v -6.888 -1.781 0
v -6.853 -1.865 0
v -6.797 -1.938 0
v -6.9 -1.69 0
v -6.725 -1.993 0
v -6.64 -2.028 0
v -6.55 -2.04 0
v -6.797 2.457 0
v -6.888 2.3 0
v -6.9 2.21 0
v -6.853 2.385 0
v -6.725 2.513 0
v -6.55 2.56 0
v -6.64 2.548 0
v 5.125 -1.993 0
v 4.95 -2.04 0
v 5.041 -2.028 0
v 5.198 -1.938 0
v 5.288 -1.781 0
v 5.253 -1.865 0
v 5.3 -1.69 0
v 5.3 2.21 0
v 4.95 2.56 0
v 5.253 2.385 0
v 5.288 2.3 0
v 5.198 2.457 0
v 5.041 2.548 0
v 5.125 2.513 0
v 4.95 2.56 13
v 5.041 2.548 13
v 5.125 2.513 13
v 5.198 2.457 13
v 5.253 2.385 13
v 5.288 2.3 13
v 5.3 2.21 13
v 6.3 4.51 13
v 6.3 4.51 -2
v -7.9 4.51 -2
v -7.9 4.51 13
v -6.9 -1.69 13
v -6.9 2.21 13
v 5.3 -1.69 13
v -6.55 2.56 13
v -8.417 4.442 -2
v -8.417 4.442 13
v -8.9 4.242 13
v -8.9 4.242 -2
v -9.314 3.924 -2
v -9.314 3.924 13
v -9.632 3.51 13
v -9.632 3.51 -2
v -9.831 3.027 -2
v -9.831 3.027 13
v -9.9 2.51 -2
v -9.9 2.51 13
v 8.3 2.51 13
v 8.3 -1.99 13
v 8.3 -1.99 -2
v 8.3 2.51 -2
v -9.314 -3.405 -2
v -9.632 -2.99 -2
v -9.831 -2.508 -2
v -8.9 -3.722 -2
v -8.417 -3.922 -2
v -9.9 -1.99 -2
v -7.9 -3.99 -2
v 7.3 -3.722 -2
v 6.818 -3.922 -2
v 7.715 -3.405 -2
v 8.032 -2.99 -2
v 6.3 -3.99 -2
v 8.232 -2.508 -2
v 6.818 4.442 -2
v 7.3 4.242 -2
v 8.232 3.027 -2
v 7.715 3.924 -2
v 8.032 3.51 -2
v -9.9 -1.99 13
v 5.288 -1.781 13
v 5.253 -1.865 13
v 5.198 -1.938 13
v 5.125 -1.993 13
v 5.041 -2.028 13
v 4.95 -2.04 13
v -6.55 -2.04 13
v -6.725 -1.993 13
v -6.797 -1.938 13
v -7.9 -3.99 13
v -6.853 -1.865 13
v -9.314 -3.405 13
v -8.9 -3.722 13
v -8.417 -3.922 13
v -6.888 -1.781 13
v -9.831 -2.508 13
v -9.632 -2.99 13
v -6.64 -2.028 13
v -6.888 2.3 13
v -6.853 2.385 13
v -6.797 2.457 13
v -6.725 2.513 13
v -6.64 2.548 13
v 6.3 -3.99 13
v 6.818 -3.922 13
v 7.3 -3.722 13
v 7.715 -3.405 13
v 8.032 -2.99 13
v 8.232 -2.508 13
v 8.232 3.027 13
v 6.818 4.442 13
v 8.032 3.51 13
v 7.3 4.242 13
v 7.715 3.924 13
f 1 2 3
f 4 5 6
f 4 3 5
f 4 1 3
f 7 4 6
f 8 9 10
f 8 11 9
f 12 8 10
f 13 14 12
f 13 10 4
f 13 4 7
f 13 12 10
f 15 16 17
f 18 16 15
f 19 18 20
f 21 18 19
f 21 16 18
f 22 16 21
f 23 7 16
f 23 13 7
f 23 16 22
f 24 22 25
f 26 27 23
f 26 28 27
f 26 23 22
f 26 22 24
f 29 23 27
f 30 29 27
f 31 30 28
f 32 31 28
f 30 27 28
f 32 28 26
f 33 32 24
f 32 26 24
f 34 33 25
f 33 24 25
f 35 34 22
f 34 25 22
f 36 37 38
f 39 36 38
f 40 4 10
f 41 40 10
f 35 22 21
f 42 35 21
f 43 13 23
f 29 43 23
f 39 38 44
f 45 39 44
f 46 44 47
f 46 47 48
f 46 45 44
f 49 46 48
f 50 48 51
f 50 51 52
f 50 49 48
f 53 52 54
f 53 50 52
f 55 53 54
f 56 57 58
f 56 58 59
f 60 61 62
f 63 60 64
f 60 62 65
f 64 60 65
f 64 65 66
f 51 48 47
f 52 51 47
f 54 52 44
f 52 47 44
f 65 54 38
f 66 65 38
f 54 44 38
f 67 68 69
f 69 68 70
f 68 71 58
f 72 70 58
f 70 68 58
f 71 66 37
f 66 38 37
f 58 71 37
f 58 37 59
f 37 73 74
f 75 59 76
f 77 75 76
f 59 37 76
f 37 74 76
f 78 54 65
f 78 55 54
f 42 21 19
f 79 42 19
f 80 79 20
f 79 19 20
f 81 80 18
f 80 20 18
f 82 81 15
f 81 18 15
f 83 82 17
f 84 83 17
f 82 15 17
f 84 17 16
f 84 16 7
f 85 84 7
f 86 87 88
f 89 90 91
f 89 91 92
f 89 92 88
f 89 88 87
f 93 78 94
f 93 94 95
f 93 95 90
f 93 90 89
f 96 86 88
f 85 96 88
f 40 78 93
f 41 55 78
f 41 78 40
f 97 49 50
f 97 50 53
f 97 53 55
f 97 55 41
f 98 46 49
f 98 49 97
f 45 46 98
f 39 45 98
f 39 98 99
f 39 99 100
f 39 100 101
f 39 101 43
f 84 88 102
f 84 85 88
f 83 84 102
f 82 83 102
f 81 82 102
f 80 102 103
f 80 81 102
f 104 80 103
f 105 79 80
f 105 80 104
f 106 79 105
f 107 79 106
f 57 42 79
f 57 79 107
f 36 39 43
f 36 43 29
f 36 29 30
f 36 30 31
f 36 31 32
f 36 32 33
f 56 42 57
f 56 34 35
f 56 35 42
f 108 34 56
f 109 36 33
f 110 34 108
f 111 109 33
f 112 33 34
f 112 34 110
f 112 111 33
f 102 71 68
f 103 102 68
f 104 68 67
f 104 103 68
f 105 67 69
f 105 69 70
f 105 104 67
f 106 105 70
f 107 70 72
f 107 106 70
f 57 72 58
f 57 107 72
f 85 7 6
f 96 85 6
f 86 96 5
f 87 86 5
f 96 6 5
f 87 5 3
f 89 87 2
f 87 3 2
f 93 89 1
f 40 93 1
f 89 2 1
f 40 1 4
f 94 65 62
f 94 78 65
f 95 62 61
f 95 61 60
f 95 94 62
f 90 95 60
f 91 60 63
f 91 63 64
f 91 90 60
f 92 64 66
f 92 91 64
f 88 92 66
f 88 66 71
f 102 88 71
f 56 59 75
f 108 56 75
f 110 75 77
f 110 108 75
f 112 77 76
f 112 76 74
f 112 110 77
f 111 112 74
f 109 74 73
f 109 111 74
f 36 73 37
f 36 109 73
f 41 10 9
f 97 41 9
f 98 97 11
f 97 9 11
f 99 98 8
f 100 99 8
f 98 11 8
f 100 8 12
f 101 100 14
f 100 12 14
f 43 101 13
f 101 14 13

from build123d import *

# Parameters (mm, degrees)
F0_W     = 0.7
F0_H     = 0.3
F0_W_2   = 0.25
F1_DEPTH = 13
F0_W_3   = 0.1
F2_DEPTH = 2


with BuildPart() as f1:
    # F0 (on Top) → F1 (new body)
    with BuildSketch(Plane.XY):
        with BuildLine():
            ThreePointArc((-9.8996258792, -1.990333008), (-9.3138394415, -3.4045465704), (-7.8996258792, -3.990333008))
            Line((-7.8996258792, -3.990333008), (6.3003741208, -3.990333008))
            ThreePointArc((6.3003741208, -3.990333008), (7.7145876832, -3.4045465704), (8.3003741208, -1.990333008))
            Line((8.3003741208, -1.990333008), (8.3003741208, 2.509666992))
            ThreePointArc((8.3003741208, 2.509666992), (7.7145876832, 3.9238805544), (6.3003741208, 4.509666992))
            Line((6.3003741208, 4.509666992), (-7.8996258792, 4.509666992))
            ThreePointArc((-7.8996258792, 4.509666992), (-9.3138394415, 3.9238805544), (-9.8996258792, 2.509666992))
            Line((-9.8996258792, 2.509666992), (-9.8996258792, -1.990333008))
        make_face()
        with BuildLine():
            Line((-8.6496258792, 1.359666992), (-7.5996258792, 1.359666992))
            Line((-7.5996258792, 1.359666992), (-7.5996258792, 2.209666992))
            ThreePointArc((-7.5996258792, 2.209666992), (-7.2920879994, 2.9521291122), (-6.5496258792, 3.259666992))
            Line((-6.5496258792, 3.259666992), (4.9503741208, 3.259666992))
            ThreePointArc((4.9503741208, 3.259666992), (5.6928362411, 2.9521291122), (6.0003741208, 2.209666992))
            Line((6.0003741208, 2.209666992), (6.0003741208, 1.359666992))
            Line((6.0003741208, 1.359666992), (7.0503741208, 1.359666992))
            Line((7.0503741208, 1.359666992), (7.0503741208, 0.359666992))
            Line((7.0503741208, 0.359666992), (7.0503741208, -0.840333008))
            Line((7.0503741208, -0.840333008), (6.0003741208, -0.840333008))
            Line((6.0003741208, -0.840333008), (6.0003741208, -1.690333008))
            ThreePointArc((6.0003741208, -1.690333008), (5.6928362411, -2.4327951283), (4.9503741208, -2.740333008))
            Line((4.9503741208, -2.740333008), (-6.5496258792, -2.740333008))
            ThreePointArc((-6.5496258792, -2.740333008), (-7.2920879994, -2.4327951283), (-7.5996258792, -1.690333008))
            Line((-7.5996258792, -1.690333008), (-7.5996258792, -0.840333008))
            Line((-7.5996258792, -0.840333008), (-8.6496258792, -0.840333008))
            Line((-8.6496258792, -0.840333008), (-8.6496258792, 0.359666992))
            Line((-8.6496258792, 0.359666992), (-8.6496258792, 1.359666992))
        make_face(mode=Mode.SUBTRACT)
        with BuildLine():
            Line((-7.5996258792, 0.559666992), (-6.8996258792, 0.559666992))
            Line((-6.8996258792, 0.559666992), (-6.8996258792, 0.759666992))
            Line((-6.8996258792, 0.759666992), (-6.8996258792, 2.209666992))
            ThreePointArc((-6.8996258792, 2.209666992), (-6.7971132526, 2.4571543654), (-6.5496258792, 2.559666992))
            Line((-6.5496258792, 2.559666992), (4.9503741208, 2.559666992))
            ThreePointArc((4.9503741208, 2.559666992), (5.1978614943, 2.4571543654), (5.3003741208, 2.209666992))
            Line((5.3003741208, 2.209666992), (5.3003741208, 0.759666992))
            Line((5.3003741208, 0.759666992), (5.3003741208, 0.559666992))
            Line((5.3003741208, 0.559666992), (6.0003741208, 0.559666992))
            Line((6.0003741208, 0.559666992), (6.0003741208, 1.359666992))
            Line((6.0003741208, 1.359666992), (6.0003741208, 2.209666992))
            ThreePointArc((6.0003741208, 2.209666992), (5.6928362411, 2.9521291122), (4.9503741208, 3.259666992))
            Line((4.9503741208, 3.259666992), (-6.5496258792, 3.259666992))
            ThreePointArc((-6.5496258792, 3.259666992), (-7.2920879994, 2.9521291122), (-7.5996258792, 2.209666992))
            Line((-7.5996258792, 2.209666992), (-7.5996258792, 1.359666992))
            Line((-7.5996258792, 1.359666992), (-7.5996258792, 0.559666992))
        make_face()
        Polygon((-7.8496258792, 0.559666992), (-7.5996258792, 0.559666992), (-7.5996258792, 1.359666992), (-8.6496258792, 1.359666992), (-8.6496258792, 0.359666992), (-8.6496258792, -0.840333008), (-7.5996258792, -0.840333008), (-7.5996258792, -0.040333008), (-7.8496258792, -0.040333008), (-7.8496258792, 0.259666992), align=None)
        with Locations((-7.2496258792, 0.409666992)):
            Rectangle(F0_W, F0_H)
        with Locations((-7.7246258792, 0.409666992)):
            Rectangle(F0_W_2, F0_H)
        with Locations((-7.2496258792, 0.109666992)):
            Rectangle(F0_W, F0_H)
        with BuildLine():
            Line((-6.8996258792, -1.690333008), (-6.8996258792, -0.040333008))
            Line((-6.8996258792, -0.040333008), (-7.5996258792, -0.040333008))
            Line((-7.5996258792, -0.040333008), (-7.5996258792, -0.840333008))
            Line((-7.5996258792, -0.840333008), (-7.5996258792, -1.690333008))
            ThreePointArc((-7.5996258792, -1.690333008), (-7.2920879994, -2.4327951283), (-6.5496258792, -2.740333008))
            Line((-6.5496258792, -2.740333008), (4.9503741208, -2.740333008))
            ThreePointArc((4.9503741208, -2.740333008), (5.6928362411, -2.4327951283), (6.0003741208, -1.690333008))
            Line((6.0003741208, -1.690333008), (6.0003741208, -0.840333008))
            Line((6.0003741208, -0.840333008), (6.0003741208, -0.040333008))
            Line((6.0003741208, -0.040333008), (5.3003741208, -0.040333008))
            Line((5.3003741208, -0.040333008), (5.3003741208, -1.690333008))
            ThreePointArc((5.3003741208, -1.690333008), (5.1978614943, -1.9378203814), (4.9503741208, -2.040333008))
            Line((4.9503741208, -2.040333008), (-6.5496258792, -2.040333008))
            ThreePointArc((-6.5496258792, -2.040333008), (-6.7971132526, -1.9378203814), (-6.8996258792, -1.690333008))
        make_face()
        with Locations((5.6503741208, 0.109666992)):
            Rectangle(F0_W, F0_H)
        with Locations((5.6503741208, 0.409666992)):
            Rectangle(F0_W, F0_H)
        Polygon((6.0003741208, 1.359666992), (6.0003741208, 0.559666992), (6.2503741208, 0.559666992), (6.2503741208, 0.259666992), (6.2503741208, -0.040333008), (6.0003741208, -0.040333008), (6.0003741208, -0.840333008), (7.0503741208, -0.840333008), (7.0503741208, 0.359666992), (7.0503741208, 1.359666992), align=None)
        with Locations((6.1253741208, 0.409666992)):
            Rectangle(F0_W_2, F0_H)
        with Locations((6.1253741208, 0.109666992)):
            Rectangle(F0_W_2, F0_H)
        with Locations((-7.7246258792, 0.109666992)):
            Rectangle(F0_W_2, F0_H)
    extrude(amount=F1_DEPTH)

    # F0 (on Top) → F2 (join)
    with BuildSketch(Plane.XY):
        with BuildLine():
            ThreePointArc((-9.8996258792, -1.990333008), (-9.3138394415, -3.4045465704), (-7.8996258792, -3.990333008))
            Line((-7.8996258792, -3.990333008), (6.3003741208, -3.990333008))
            ThreePointArc((6.3003741208, -3.990333008), (7.7145876832, -3.4045465704), (8.3003741208, -1.990333008))
            Line((8.3003741208, -1.990333008), (8.3003741208, 2.509666992))
            ThreePointArc((8.3003741208, 2.509666992), (7.7145876832, 3.9238805544), (6.3003741208, 4.509666992))
            Line((6.3003741208, 4.509666992), (-7.8996258792, 4.509666992))
            ThreePointArc((-7.8996258792, 4.509666992), (-9.3138394415, 3.9238805544), (-9.8996258792, 2.509666992))
            Line((-9.8996258792, 2.509666992), (-9.8996258792, -1.990333008))
        make_face()
        with BuildLine():
            Line((-8.6496258792, 1.359666992), (-7.5996258792, 1.359666992))
            Line((-7.5996258792, 1.359666992), (-7.5996258792, 2.209666992))
            ThreePointArc((-7.5996258792, 2.209666992), (-7.2920879994, 2.9521291122), (-6.5496258792, 3.259666992))
            Line((-6.5496258792, 3.259666992), (4.9503741208, 3.259666992))
            ThreePointArc((4.9503741208, 3.259666992), (5.6928362411, 2.9521291122), (6.0003741208, 2.209666992))
            Line((6.0003741208, 2.209666992), (6.0003741208, 1.359666992))
            Line((6.0003741208, 1.359666992), (7.0503741208, 1.359666992))
            Line((7.0503741208, 1.359666992), (7.0503741208, 0.359666992))
            Line((7.0503741208, 0.359666992), (7.0503741208, -0.840333008))
            Line((7.0503741208, -0.840333008), (6.0003741208, -0.840333008))
            Line((6.0003741208, -0.840333008), (6.0003741208, -1.690333008))
            ThreePointArc((6.0003741208, -1.690333008), (5.6928362411, -2.4327951283), (4.9503741208, -2.740333008))
            Line((4.9503741208, -2.740333008), (-6.5496258792, -2.740333008))
            ThreePointArc((-6.5496258792, -2.740333008), (-7.2920879994, -2.4327951283), (-7.5996258792, -1.690333008))
            Line((-7.5996258792, -1.690333008), (-7.5996258792, -0.840333008))
            Line((-7.5996258792, -0.840333008), (-8.6496258792, -0.840333008))
            Line((-8.6496258792, -0.840333008), (-8.6496258792, 0.359666992))
            Line((-8.6496258792, 0.359666992), (-8.6496258792, 1.359666992))
        make_face(mode=Mode.SUBTRACT)
        with BuildLine():
            Line((4.9503741208, 2.459666992), (-6.5496258792, 2.459666992))
            ThreePointArc((-6.5496258792, 2.459666992), (-6.7264025745, 2.3864436873), (-6.7996258792, 2.209666992))
            Line((-6.7996258792, 2.209666992), (-6.7996258792, 0.559666992))
            Line((-6.7996258792, 0.559666992), (-6.7996258792, 0.259666992))
            Line((-6.7996258792, 0.259666992), (-6.7996258792, -0.040333008))
            Line((-6.7996258792, -0.040333008), (-6.7996258792, -1.690333008))
            ThreePointArc((-6.7996258792, -1.690333008), (-6.7264025745, -1.8671097033), (-6.5496258792, -1.940333008))
            Line((-6.5496258792, -1.940333008), (4.9503741208, -1.940333008))
            ThreePointArc((4.9503741208, -1.940333008), (5.1271508161, -1.8671097033), (5.2003741208, -1.690333008))
            Line((5.2003741208, -1.690333008), (5.2003741208, -0.040333008))
            Line((5.2003741208, -0.040333008), (5.2003741208, 0.259666992))
            Line((5.2003741208, 0.259666992), (5.2003741208, 0.559666992))
            Line((5.2003741208, 0.559666992), (5.2003741208, 2.209666992))
            ThreePointArc((5.2003741208, 2.209666992), (5.1271508161, 2.3864436873), (4.9503741208, 2.459666992))
        make_face()
        with BuildLine():
            Line((-6.8996258792, -1.690333008), (-6.8996258792, -0.040333008))
            Line((-6.8996258792, -0.040333008), (-7.5996258792, -0.040333008))
            Line((-7.5996258792, -0.040333008), (-7.5996258792, -0.840333008))
            Line((-7.5996258792, -0.840333008), (-7.5996258792, -1.690333008))
            ThreePointArc((-7.5996258792, -1.690333008), (-7.2920879994, -2.4327951283), (-6.5496258792, -2.740333008))
            Line((-6.5496258792, -2.740333008), (4.9503741208, -2.740333008))
            ThreePointArc((4.9503741208, -2.740333008), (5.6928362411, -2.4327951283), (6.0003741208, -1.690333008))
            Line((6.0003741208, -1.690333008), (6.0003741208, -0.840333008))
            Line((6.0003741208, -0.840333008), (6.0003741208, -0.040333008))
            Line((6.0003741208, -0.040333008), (5.3003741208, -0.040333008))
            Line((5.3003741208, -0.040333008), (5.3003741208, -1.690333008))
            ThreePointArc((5.3003741208, -1.690333008), (5.1978614943, -1.9378203814), (4.9503741208, -2.040333008))
            Line((4.9503741208, -2.040333008), (-6.5496258792, -2.040333008))
            ThreePointArc((-6.5496258792, -2.040333008), (-6.7971132526, -1.9378203814), (-6.8996258792, -1.690333008))
        make_face()
        with BuildLine():
            Line((-7.5996258792, 0.559666992), (-6.8996258792, 0.559666992))
            Line((-6.8996258792, 0.559666992), (-6.8996258792, 0.759666992))
            Line((-6.8996258792, 0.759666992), (-6.8996258792, 2.209666992))
            ThreePointArc((-6.8996258792, 2.209666992), (-6.7971132526, 2.4571543654), (-6.5496258792, 2.559666992))
            Line((-6.5496258792, 2.559666992), (4.9503741208, 2.559666992))
            ThreePointArc((4.9503741208, 2.559666992), (5.1978614943, 2.4571543654), (5.3003741208, 2.209666992))
            Line((5.3003741208, 2.209666992), (5.3003741208, 0.759666992))
            Line((5.3003741208, 0.759666992), (5.3003741208, 0.559666992))
            Line((5.3003741208, 0.559666992), (6.0003741208, 0.559666992))
            Line((6.0003741208, 0.559666992), (6.0003741208, 1.359666992))
            Line((6.0003741208, 1.359666992), (6.0003741208, 2.209666992))
            ThreePointArc((6.0003741208, 2.209666992), (5.6928362411, 2.9521291122), (4.9503741208, 3.259666992))
            Line((4.9503741208, 3.259666992), (-6.5496258792, 3.259666992))
            ThreePointArc((-6.5496258792, 3.259666992), (-7.2920879994, 2.9521291122), (-7.5996258792, 2.209666992))
            Line((-7.5996258792, 2.209666992), (-7.5996258792, 1.359666992))
            Line((-7.5996258792, 1.359666992), (-7.5996258792, 0.559666992))
        make_face()
        Polygon((-7.8496258792, 0.559666992), (-7.5996258792, 0.559666992), (-7.5996258792, 1.359666992), (-8.6496258792, 1.359666992), (-8.6496258792, 0.359666992), (-8.6496258792, -0.840333008), (-7.5996258792, -0.840333008), (-7.5996258792, -0.040333008), (-7.8496258792, -0.040333008), (-7.8496258792, 0.259666992), align=None)
        Polygon((6.0003741208, 1.359666992), (6.0003741208, 0.559666992), (6.2503741208, 0.559666992), (6.2503741208, 0.259666992), (6.2503741208, -0.040333008), (6.0003741208, -0.040333008), (6.0003741208, -0.840333008), (7.0503741208, -0.840333008), (7.0503741208, 0.359666992), (7.0503741208, 1.359666992), align=None)
        with BuildLine():
            Line((-6.7996258792, -1.690333008), (-6.7996258792, -0.040333008))
            Line((-6.7996258792, -0.040333008), (-6.8996258792, -0.040333008))
            Line((-6.8996258792, -0.040333008), (-6.8996258792, -1.690333008))
            ThreePointArc((-6.8996258792, -1.690333008), (-6.7971132526, -1.9378203814), (-6.5496258792, -2.040333008))
            Line((-6.5496258792, -2.040333008), (4.9503741208, -2.040333008))
            ThreePointArc((4.9503741208, -2.040333008), (5.1978614943, -1.9378203814), (5.3003741208, -1.690333008))
            Line((5.3003741208, -1.690333008), (5.3003741208, -0.040333008))
            Line((5.3003741208, -0.040333008), (5.2003741208, -0.040333008))
            Line((5.2003741208, -0.040333008), (5.2003741208, -1.690333008))
            ThreePointArc((5.2003741208, -1.690333008), (5.1271508161, -1.8671097033), (4.9503741208, -1.940333008))
            Line((4.9503741208, -1.940333008), (-6.5496258792, -1.940333008))
            ThreePointArc((-6.5496258792, -1.940333008), (-6.7264025745, -1.8671097033), (-6.7996258792, -1.690333008))
        make_face()
        with BuildLine():
            ThreePointArc((-6.7996258792, 2.209666992), (-6.7264025745, 2.3864436873), (-6.5496258792, 2.459666992))
            Line((-6.5496258792, 2.459666992), (4.9503741208, 2.459666992))
            ThreePointArc((4.9503741208, 2.459666992), (5.1271508161, 2.3864436873), (5.2003741208, 2.209666992))
            Line((5.2003741208, 2.209666992), (5.2003741208, 0.559666992))
            Line((5.2003741208, 0.559666992), (5.3003741208, 0.559666992))
            Line((5.3003741208, 0.559666992), (5.3003741208, 0.759666992))
            Line((5.3003741208, 0.759666992), (5.3003741208, 2.209666992))
            ThreePointArc((5.3003741208, 2.209666992), (5.1978614943, 2.4571543654), (4.9503741208, 2.559666992))
            Line((4.9503741208, 2.559666992), (-6.5496258792, 2.559666992))
            ThreePointArc((-6.5496258792, 2.559666992), (-6.7971132526, 2.4571543654), (-6.8996258792, 2.209666992))
            Line((-6.8996258792, 2.209666992), (-6.8996258792, 0.759666992))
            Line((-6.8996258792, 0.759666992), (-6.8996258792, 0.559666992))
            Line((-6.8996258792, 0.559666992), (-6.7996258792, 0.559666992))
            Line((-6.7996258792, 0.559666992), (-6.7996258792, 2.209666992))
        make_face()
        with Locations((5.6503741208, 0.109666992)):
            Rectangle(F0_W, F0_H)
        with Locations((-7.2496258792, 0.109666992)):
            Rectangle(F0_W, F0_H)
        with Locations((-7.2496258792, 0.409666992)):
            Rectangle(F0_W, F0_H)
        with Locations((5.6503741208, 0.409666992)):
            Rectangle(F0_W, F0_H)
        with Locations((6.1253741208, 0.409666992)):
            Rectangle(F0_W_2, F0_H)
        with Locations((6.1253741208, 0.109666992)):
            Rectangle(F0_W_2, F0_H)
        with Locations((-7.7246258792, 0.109666992)):
            Rectangle(F0_W_2, F0_H)
        with Locations((-7.7246258792, 0.409666992)):
            Rectangle(F0_W_2, F0_H)
        with Locations((5.2503741208, 0.409666992)):
            Rectangle(F0_W_3, F0_H)
        with Locations((5.2503741208, 0.109666992)):
            Rectangle(F0_W_3, F0_H)
        with Locations((-6.8496258792, 0.109666992)):
            Rectangle(F0_W_3, F0_H)
        with Locations((-6.8496258792, 0.409666992)):
            Rectangle(F0_W_3, F0_H)
    extrude(amount=-F2_DEPTH)


solid = f1.part
